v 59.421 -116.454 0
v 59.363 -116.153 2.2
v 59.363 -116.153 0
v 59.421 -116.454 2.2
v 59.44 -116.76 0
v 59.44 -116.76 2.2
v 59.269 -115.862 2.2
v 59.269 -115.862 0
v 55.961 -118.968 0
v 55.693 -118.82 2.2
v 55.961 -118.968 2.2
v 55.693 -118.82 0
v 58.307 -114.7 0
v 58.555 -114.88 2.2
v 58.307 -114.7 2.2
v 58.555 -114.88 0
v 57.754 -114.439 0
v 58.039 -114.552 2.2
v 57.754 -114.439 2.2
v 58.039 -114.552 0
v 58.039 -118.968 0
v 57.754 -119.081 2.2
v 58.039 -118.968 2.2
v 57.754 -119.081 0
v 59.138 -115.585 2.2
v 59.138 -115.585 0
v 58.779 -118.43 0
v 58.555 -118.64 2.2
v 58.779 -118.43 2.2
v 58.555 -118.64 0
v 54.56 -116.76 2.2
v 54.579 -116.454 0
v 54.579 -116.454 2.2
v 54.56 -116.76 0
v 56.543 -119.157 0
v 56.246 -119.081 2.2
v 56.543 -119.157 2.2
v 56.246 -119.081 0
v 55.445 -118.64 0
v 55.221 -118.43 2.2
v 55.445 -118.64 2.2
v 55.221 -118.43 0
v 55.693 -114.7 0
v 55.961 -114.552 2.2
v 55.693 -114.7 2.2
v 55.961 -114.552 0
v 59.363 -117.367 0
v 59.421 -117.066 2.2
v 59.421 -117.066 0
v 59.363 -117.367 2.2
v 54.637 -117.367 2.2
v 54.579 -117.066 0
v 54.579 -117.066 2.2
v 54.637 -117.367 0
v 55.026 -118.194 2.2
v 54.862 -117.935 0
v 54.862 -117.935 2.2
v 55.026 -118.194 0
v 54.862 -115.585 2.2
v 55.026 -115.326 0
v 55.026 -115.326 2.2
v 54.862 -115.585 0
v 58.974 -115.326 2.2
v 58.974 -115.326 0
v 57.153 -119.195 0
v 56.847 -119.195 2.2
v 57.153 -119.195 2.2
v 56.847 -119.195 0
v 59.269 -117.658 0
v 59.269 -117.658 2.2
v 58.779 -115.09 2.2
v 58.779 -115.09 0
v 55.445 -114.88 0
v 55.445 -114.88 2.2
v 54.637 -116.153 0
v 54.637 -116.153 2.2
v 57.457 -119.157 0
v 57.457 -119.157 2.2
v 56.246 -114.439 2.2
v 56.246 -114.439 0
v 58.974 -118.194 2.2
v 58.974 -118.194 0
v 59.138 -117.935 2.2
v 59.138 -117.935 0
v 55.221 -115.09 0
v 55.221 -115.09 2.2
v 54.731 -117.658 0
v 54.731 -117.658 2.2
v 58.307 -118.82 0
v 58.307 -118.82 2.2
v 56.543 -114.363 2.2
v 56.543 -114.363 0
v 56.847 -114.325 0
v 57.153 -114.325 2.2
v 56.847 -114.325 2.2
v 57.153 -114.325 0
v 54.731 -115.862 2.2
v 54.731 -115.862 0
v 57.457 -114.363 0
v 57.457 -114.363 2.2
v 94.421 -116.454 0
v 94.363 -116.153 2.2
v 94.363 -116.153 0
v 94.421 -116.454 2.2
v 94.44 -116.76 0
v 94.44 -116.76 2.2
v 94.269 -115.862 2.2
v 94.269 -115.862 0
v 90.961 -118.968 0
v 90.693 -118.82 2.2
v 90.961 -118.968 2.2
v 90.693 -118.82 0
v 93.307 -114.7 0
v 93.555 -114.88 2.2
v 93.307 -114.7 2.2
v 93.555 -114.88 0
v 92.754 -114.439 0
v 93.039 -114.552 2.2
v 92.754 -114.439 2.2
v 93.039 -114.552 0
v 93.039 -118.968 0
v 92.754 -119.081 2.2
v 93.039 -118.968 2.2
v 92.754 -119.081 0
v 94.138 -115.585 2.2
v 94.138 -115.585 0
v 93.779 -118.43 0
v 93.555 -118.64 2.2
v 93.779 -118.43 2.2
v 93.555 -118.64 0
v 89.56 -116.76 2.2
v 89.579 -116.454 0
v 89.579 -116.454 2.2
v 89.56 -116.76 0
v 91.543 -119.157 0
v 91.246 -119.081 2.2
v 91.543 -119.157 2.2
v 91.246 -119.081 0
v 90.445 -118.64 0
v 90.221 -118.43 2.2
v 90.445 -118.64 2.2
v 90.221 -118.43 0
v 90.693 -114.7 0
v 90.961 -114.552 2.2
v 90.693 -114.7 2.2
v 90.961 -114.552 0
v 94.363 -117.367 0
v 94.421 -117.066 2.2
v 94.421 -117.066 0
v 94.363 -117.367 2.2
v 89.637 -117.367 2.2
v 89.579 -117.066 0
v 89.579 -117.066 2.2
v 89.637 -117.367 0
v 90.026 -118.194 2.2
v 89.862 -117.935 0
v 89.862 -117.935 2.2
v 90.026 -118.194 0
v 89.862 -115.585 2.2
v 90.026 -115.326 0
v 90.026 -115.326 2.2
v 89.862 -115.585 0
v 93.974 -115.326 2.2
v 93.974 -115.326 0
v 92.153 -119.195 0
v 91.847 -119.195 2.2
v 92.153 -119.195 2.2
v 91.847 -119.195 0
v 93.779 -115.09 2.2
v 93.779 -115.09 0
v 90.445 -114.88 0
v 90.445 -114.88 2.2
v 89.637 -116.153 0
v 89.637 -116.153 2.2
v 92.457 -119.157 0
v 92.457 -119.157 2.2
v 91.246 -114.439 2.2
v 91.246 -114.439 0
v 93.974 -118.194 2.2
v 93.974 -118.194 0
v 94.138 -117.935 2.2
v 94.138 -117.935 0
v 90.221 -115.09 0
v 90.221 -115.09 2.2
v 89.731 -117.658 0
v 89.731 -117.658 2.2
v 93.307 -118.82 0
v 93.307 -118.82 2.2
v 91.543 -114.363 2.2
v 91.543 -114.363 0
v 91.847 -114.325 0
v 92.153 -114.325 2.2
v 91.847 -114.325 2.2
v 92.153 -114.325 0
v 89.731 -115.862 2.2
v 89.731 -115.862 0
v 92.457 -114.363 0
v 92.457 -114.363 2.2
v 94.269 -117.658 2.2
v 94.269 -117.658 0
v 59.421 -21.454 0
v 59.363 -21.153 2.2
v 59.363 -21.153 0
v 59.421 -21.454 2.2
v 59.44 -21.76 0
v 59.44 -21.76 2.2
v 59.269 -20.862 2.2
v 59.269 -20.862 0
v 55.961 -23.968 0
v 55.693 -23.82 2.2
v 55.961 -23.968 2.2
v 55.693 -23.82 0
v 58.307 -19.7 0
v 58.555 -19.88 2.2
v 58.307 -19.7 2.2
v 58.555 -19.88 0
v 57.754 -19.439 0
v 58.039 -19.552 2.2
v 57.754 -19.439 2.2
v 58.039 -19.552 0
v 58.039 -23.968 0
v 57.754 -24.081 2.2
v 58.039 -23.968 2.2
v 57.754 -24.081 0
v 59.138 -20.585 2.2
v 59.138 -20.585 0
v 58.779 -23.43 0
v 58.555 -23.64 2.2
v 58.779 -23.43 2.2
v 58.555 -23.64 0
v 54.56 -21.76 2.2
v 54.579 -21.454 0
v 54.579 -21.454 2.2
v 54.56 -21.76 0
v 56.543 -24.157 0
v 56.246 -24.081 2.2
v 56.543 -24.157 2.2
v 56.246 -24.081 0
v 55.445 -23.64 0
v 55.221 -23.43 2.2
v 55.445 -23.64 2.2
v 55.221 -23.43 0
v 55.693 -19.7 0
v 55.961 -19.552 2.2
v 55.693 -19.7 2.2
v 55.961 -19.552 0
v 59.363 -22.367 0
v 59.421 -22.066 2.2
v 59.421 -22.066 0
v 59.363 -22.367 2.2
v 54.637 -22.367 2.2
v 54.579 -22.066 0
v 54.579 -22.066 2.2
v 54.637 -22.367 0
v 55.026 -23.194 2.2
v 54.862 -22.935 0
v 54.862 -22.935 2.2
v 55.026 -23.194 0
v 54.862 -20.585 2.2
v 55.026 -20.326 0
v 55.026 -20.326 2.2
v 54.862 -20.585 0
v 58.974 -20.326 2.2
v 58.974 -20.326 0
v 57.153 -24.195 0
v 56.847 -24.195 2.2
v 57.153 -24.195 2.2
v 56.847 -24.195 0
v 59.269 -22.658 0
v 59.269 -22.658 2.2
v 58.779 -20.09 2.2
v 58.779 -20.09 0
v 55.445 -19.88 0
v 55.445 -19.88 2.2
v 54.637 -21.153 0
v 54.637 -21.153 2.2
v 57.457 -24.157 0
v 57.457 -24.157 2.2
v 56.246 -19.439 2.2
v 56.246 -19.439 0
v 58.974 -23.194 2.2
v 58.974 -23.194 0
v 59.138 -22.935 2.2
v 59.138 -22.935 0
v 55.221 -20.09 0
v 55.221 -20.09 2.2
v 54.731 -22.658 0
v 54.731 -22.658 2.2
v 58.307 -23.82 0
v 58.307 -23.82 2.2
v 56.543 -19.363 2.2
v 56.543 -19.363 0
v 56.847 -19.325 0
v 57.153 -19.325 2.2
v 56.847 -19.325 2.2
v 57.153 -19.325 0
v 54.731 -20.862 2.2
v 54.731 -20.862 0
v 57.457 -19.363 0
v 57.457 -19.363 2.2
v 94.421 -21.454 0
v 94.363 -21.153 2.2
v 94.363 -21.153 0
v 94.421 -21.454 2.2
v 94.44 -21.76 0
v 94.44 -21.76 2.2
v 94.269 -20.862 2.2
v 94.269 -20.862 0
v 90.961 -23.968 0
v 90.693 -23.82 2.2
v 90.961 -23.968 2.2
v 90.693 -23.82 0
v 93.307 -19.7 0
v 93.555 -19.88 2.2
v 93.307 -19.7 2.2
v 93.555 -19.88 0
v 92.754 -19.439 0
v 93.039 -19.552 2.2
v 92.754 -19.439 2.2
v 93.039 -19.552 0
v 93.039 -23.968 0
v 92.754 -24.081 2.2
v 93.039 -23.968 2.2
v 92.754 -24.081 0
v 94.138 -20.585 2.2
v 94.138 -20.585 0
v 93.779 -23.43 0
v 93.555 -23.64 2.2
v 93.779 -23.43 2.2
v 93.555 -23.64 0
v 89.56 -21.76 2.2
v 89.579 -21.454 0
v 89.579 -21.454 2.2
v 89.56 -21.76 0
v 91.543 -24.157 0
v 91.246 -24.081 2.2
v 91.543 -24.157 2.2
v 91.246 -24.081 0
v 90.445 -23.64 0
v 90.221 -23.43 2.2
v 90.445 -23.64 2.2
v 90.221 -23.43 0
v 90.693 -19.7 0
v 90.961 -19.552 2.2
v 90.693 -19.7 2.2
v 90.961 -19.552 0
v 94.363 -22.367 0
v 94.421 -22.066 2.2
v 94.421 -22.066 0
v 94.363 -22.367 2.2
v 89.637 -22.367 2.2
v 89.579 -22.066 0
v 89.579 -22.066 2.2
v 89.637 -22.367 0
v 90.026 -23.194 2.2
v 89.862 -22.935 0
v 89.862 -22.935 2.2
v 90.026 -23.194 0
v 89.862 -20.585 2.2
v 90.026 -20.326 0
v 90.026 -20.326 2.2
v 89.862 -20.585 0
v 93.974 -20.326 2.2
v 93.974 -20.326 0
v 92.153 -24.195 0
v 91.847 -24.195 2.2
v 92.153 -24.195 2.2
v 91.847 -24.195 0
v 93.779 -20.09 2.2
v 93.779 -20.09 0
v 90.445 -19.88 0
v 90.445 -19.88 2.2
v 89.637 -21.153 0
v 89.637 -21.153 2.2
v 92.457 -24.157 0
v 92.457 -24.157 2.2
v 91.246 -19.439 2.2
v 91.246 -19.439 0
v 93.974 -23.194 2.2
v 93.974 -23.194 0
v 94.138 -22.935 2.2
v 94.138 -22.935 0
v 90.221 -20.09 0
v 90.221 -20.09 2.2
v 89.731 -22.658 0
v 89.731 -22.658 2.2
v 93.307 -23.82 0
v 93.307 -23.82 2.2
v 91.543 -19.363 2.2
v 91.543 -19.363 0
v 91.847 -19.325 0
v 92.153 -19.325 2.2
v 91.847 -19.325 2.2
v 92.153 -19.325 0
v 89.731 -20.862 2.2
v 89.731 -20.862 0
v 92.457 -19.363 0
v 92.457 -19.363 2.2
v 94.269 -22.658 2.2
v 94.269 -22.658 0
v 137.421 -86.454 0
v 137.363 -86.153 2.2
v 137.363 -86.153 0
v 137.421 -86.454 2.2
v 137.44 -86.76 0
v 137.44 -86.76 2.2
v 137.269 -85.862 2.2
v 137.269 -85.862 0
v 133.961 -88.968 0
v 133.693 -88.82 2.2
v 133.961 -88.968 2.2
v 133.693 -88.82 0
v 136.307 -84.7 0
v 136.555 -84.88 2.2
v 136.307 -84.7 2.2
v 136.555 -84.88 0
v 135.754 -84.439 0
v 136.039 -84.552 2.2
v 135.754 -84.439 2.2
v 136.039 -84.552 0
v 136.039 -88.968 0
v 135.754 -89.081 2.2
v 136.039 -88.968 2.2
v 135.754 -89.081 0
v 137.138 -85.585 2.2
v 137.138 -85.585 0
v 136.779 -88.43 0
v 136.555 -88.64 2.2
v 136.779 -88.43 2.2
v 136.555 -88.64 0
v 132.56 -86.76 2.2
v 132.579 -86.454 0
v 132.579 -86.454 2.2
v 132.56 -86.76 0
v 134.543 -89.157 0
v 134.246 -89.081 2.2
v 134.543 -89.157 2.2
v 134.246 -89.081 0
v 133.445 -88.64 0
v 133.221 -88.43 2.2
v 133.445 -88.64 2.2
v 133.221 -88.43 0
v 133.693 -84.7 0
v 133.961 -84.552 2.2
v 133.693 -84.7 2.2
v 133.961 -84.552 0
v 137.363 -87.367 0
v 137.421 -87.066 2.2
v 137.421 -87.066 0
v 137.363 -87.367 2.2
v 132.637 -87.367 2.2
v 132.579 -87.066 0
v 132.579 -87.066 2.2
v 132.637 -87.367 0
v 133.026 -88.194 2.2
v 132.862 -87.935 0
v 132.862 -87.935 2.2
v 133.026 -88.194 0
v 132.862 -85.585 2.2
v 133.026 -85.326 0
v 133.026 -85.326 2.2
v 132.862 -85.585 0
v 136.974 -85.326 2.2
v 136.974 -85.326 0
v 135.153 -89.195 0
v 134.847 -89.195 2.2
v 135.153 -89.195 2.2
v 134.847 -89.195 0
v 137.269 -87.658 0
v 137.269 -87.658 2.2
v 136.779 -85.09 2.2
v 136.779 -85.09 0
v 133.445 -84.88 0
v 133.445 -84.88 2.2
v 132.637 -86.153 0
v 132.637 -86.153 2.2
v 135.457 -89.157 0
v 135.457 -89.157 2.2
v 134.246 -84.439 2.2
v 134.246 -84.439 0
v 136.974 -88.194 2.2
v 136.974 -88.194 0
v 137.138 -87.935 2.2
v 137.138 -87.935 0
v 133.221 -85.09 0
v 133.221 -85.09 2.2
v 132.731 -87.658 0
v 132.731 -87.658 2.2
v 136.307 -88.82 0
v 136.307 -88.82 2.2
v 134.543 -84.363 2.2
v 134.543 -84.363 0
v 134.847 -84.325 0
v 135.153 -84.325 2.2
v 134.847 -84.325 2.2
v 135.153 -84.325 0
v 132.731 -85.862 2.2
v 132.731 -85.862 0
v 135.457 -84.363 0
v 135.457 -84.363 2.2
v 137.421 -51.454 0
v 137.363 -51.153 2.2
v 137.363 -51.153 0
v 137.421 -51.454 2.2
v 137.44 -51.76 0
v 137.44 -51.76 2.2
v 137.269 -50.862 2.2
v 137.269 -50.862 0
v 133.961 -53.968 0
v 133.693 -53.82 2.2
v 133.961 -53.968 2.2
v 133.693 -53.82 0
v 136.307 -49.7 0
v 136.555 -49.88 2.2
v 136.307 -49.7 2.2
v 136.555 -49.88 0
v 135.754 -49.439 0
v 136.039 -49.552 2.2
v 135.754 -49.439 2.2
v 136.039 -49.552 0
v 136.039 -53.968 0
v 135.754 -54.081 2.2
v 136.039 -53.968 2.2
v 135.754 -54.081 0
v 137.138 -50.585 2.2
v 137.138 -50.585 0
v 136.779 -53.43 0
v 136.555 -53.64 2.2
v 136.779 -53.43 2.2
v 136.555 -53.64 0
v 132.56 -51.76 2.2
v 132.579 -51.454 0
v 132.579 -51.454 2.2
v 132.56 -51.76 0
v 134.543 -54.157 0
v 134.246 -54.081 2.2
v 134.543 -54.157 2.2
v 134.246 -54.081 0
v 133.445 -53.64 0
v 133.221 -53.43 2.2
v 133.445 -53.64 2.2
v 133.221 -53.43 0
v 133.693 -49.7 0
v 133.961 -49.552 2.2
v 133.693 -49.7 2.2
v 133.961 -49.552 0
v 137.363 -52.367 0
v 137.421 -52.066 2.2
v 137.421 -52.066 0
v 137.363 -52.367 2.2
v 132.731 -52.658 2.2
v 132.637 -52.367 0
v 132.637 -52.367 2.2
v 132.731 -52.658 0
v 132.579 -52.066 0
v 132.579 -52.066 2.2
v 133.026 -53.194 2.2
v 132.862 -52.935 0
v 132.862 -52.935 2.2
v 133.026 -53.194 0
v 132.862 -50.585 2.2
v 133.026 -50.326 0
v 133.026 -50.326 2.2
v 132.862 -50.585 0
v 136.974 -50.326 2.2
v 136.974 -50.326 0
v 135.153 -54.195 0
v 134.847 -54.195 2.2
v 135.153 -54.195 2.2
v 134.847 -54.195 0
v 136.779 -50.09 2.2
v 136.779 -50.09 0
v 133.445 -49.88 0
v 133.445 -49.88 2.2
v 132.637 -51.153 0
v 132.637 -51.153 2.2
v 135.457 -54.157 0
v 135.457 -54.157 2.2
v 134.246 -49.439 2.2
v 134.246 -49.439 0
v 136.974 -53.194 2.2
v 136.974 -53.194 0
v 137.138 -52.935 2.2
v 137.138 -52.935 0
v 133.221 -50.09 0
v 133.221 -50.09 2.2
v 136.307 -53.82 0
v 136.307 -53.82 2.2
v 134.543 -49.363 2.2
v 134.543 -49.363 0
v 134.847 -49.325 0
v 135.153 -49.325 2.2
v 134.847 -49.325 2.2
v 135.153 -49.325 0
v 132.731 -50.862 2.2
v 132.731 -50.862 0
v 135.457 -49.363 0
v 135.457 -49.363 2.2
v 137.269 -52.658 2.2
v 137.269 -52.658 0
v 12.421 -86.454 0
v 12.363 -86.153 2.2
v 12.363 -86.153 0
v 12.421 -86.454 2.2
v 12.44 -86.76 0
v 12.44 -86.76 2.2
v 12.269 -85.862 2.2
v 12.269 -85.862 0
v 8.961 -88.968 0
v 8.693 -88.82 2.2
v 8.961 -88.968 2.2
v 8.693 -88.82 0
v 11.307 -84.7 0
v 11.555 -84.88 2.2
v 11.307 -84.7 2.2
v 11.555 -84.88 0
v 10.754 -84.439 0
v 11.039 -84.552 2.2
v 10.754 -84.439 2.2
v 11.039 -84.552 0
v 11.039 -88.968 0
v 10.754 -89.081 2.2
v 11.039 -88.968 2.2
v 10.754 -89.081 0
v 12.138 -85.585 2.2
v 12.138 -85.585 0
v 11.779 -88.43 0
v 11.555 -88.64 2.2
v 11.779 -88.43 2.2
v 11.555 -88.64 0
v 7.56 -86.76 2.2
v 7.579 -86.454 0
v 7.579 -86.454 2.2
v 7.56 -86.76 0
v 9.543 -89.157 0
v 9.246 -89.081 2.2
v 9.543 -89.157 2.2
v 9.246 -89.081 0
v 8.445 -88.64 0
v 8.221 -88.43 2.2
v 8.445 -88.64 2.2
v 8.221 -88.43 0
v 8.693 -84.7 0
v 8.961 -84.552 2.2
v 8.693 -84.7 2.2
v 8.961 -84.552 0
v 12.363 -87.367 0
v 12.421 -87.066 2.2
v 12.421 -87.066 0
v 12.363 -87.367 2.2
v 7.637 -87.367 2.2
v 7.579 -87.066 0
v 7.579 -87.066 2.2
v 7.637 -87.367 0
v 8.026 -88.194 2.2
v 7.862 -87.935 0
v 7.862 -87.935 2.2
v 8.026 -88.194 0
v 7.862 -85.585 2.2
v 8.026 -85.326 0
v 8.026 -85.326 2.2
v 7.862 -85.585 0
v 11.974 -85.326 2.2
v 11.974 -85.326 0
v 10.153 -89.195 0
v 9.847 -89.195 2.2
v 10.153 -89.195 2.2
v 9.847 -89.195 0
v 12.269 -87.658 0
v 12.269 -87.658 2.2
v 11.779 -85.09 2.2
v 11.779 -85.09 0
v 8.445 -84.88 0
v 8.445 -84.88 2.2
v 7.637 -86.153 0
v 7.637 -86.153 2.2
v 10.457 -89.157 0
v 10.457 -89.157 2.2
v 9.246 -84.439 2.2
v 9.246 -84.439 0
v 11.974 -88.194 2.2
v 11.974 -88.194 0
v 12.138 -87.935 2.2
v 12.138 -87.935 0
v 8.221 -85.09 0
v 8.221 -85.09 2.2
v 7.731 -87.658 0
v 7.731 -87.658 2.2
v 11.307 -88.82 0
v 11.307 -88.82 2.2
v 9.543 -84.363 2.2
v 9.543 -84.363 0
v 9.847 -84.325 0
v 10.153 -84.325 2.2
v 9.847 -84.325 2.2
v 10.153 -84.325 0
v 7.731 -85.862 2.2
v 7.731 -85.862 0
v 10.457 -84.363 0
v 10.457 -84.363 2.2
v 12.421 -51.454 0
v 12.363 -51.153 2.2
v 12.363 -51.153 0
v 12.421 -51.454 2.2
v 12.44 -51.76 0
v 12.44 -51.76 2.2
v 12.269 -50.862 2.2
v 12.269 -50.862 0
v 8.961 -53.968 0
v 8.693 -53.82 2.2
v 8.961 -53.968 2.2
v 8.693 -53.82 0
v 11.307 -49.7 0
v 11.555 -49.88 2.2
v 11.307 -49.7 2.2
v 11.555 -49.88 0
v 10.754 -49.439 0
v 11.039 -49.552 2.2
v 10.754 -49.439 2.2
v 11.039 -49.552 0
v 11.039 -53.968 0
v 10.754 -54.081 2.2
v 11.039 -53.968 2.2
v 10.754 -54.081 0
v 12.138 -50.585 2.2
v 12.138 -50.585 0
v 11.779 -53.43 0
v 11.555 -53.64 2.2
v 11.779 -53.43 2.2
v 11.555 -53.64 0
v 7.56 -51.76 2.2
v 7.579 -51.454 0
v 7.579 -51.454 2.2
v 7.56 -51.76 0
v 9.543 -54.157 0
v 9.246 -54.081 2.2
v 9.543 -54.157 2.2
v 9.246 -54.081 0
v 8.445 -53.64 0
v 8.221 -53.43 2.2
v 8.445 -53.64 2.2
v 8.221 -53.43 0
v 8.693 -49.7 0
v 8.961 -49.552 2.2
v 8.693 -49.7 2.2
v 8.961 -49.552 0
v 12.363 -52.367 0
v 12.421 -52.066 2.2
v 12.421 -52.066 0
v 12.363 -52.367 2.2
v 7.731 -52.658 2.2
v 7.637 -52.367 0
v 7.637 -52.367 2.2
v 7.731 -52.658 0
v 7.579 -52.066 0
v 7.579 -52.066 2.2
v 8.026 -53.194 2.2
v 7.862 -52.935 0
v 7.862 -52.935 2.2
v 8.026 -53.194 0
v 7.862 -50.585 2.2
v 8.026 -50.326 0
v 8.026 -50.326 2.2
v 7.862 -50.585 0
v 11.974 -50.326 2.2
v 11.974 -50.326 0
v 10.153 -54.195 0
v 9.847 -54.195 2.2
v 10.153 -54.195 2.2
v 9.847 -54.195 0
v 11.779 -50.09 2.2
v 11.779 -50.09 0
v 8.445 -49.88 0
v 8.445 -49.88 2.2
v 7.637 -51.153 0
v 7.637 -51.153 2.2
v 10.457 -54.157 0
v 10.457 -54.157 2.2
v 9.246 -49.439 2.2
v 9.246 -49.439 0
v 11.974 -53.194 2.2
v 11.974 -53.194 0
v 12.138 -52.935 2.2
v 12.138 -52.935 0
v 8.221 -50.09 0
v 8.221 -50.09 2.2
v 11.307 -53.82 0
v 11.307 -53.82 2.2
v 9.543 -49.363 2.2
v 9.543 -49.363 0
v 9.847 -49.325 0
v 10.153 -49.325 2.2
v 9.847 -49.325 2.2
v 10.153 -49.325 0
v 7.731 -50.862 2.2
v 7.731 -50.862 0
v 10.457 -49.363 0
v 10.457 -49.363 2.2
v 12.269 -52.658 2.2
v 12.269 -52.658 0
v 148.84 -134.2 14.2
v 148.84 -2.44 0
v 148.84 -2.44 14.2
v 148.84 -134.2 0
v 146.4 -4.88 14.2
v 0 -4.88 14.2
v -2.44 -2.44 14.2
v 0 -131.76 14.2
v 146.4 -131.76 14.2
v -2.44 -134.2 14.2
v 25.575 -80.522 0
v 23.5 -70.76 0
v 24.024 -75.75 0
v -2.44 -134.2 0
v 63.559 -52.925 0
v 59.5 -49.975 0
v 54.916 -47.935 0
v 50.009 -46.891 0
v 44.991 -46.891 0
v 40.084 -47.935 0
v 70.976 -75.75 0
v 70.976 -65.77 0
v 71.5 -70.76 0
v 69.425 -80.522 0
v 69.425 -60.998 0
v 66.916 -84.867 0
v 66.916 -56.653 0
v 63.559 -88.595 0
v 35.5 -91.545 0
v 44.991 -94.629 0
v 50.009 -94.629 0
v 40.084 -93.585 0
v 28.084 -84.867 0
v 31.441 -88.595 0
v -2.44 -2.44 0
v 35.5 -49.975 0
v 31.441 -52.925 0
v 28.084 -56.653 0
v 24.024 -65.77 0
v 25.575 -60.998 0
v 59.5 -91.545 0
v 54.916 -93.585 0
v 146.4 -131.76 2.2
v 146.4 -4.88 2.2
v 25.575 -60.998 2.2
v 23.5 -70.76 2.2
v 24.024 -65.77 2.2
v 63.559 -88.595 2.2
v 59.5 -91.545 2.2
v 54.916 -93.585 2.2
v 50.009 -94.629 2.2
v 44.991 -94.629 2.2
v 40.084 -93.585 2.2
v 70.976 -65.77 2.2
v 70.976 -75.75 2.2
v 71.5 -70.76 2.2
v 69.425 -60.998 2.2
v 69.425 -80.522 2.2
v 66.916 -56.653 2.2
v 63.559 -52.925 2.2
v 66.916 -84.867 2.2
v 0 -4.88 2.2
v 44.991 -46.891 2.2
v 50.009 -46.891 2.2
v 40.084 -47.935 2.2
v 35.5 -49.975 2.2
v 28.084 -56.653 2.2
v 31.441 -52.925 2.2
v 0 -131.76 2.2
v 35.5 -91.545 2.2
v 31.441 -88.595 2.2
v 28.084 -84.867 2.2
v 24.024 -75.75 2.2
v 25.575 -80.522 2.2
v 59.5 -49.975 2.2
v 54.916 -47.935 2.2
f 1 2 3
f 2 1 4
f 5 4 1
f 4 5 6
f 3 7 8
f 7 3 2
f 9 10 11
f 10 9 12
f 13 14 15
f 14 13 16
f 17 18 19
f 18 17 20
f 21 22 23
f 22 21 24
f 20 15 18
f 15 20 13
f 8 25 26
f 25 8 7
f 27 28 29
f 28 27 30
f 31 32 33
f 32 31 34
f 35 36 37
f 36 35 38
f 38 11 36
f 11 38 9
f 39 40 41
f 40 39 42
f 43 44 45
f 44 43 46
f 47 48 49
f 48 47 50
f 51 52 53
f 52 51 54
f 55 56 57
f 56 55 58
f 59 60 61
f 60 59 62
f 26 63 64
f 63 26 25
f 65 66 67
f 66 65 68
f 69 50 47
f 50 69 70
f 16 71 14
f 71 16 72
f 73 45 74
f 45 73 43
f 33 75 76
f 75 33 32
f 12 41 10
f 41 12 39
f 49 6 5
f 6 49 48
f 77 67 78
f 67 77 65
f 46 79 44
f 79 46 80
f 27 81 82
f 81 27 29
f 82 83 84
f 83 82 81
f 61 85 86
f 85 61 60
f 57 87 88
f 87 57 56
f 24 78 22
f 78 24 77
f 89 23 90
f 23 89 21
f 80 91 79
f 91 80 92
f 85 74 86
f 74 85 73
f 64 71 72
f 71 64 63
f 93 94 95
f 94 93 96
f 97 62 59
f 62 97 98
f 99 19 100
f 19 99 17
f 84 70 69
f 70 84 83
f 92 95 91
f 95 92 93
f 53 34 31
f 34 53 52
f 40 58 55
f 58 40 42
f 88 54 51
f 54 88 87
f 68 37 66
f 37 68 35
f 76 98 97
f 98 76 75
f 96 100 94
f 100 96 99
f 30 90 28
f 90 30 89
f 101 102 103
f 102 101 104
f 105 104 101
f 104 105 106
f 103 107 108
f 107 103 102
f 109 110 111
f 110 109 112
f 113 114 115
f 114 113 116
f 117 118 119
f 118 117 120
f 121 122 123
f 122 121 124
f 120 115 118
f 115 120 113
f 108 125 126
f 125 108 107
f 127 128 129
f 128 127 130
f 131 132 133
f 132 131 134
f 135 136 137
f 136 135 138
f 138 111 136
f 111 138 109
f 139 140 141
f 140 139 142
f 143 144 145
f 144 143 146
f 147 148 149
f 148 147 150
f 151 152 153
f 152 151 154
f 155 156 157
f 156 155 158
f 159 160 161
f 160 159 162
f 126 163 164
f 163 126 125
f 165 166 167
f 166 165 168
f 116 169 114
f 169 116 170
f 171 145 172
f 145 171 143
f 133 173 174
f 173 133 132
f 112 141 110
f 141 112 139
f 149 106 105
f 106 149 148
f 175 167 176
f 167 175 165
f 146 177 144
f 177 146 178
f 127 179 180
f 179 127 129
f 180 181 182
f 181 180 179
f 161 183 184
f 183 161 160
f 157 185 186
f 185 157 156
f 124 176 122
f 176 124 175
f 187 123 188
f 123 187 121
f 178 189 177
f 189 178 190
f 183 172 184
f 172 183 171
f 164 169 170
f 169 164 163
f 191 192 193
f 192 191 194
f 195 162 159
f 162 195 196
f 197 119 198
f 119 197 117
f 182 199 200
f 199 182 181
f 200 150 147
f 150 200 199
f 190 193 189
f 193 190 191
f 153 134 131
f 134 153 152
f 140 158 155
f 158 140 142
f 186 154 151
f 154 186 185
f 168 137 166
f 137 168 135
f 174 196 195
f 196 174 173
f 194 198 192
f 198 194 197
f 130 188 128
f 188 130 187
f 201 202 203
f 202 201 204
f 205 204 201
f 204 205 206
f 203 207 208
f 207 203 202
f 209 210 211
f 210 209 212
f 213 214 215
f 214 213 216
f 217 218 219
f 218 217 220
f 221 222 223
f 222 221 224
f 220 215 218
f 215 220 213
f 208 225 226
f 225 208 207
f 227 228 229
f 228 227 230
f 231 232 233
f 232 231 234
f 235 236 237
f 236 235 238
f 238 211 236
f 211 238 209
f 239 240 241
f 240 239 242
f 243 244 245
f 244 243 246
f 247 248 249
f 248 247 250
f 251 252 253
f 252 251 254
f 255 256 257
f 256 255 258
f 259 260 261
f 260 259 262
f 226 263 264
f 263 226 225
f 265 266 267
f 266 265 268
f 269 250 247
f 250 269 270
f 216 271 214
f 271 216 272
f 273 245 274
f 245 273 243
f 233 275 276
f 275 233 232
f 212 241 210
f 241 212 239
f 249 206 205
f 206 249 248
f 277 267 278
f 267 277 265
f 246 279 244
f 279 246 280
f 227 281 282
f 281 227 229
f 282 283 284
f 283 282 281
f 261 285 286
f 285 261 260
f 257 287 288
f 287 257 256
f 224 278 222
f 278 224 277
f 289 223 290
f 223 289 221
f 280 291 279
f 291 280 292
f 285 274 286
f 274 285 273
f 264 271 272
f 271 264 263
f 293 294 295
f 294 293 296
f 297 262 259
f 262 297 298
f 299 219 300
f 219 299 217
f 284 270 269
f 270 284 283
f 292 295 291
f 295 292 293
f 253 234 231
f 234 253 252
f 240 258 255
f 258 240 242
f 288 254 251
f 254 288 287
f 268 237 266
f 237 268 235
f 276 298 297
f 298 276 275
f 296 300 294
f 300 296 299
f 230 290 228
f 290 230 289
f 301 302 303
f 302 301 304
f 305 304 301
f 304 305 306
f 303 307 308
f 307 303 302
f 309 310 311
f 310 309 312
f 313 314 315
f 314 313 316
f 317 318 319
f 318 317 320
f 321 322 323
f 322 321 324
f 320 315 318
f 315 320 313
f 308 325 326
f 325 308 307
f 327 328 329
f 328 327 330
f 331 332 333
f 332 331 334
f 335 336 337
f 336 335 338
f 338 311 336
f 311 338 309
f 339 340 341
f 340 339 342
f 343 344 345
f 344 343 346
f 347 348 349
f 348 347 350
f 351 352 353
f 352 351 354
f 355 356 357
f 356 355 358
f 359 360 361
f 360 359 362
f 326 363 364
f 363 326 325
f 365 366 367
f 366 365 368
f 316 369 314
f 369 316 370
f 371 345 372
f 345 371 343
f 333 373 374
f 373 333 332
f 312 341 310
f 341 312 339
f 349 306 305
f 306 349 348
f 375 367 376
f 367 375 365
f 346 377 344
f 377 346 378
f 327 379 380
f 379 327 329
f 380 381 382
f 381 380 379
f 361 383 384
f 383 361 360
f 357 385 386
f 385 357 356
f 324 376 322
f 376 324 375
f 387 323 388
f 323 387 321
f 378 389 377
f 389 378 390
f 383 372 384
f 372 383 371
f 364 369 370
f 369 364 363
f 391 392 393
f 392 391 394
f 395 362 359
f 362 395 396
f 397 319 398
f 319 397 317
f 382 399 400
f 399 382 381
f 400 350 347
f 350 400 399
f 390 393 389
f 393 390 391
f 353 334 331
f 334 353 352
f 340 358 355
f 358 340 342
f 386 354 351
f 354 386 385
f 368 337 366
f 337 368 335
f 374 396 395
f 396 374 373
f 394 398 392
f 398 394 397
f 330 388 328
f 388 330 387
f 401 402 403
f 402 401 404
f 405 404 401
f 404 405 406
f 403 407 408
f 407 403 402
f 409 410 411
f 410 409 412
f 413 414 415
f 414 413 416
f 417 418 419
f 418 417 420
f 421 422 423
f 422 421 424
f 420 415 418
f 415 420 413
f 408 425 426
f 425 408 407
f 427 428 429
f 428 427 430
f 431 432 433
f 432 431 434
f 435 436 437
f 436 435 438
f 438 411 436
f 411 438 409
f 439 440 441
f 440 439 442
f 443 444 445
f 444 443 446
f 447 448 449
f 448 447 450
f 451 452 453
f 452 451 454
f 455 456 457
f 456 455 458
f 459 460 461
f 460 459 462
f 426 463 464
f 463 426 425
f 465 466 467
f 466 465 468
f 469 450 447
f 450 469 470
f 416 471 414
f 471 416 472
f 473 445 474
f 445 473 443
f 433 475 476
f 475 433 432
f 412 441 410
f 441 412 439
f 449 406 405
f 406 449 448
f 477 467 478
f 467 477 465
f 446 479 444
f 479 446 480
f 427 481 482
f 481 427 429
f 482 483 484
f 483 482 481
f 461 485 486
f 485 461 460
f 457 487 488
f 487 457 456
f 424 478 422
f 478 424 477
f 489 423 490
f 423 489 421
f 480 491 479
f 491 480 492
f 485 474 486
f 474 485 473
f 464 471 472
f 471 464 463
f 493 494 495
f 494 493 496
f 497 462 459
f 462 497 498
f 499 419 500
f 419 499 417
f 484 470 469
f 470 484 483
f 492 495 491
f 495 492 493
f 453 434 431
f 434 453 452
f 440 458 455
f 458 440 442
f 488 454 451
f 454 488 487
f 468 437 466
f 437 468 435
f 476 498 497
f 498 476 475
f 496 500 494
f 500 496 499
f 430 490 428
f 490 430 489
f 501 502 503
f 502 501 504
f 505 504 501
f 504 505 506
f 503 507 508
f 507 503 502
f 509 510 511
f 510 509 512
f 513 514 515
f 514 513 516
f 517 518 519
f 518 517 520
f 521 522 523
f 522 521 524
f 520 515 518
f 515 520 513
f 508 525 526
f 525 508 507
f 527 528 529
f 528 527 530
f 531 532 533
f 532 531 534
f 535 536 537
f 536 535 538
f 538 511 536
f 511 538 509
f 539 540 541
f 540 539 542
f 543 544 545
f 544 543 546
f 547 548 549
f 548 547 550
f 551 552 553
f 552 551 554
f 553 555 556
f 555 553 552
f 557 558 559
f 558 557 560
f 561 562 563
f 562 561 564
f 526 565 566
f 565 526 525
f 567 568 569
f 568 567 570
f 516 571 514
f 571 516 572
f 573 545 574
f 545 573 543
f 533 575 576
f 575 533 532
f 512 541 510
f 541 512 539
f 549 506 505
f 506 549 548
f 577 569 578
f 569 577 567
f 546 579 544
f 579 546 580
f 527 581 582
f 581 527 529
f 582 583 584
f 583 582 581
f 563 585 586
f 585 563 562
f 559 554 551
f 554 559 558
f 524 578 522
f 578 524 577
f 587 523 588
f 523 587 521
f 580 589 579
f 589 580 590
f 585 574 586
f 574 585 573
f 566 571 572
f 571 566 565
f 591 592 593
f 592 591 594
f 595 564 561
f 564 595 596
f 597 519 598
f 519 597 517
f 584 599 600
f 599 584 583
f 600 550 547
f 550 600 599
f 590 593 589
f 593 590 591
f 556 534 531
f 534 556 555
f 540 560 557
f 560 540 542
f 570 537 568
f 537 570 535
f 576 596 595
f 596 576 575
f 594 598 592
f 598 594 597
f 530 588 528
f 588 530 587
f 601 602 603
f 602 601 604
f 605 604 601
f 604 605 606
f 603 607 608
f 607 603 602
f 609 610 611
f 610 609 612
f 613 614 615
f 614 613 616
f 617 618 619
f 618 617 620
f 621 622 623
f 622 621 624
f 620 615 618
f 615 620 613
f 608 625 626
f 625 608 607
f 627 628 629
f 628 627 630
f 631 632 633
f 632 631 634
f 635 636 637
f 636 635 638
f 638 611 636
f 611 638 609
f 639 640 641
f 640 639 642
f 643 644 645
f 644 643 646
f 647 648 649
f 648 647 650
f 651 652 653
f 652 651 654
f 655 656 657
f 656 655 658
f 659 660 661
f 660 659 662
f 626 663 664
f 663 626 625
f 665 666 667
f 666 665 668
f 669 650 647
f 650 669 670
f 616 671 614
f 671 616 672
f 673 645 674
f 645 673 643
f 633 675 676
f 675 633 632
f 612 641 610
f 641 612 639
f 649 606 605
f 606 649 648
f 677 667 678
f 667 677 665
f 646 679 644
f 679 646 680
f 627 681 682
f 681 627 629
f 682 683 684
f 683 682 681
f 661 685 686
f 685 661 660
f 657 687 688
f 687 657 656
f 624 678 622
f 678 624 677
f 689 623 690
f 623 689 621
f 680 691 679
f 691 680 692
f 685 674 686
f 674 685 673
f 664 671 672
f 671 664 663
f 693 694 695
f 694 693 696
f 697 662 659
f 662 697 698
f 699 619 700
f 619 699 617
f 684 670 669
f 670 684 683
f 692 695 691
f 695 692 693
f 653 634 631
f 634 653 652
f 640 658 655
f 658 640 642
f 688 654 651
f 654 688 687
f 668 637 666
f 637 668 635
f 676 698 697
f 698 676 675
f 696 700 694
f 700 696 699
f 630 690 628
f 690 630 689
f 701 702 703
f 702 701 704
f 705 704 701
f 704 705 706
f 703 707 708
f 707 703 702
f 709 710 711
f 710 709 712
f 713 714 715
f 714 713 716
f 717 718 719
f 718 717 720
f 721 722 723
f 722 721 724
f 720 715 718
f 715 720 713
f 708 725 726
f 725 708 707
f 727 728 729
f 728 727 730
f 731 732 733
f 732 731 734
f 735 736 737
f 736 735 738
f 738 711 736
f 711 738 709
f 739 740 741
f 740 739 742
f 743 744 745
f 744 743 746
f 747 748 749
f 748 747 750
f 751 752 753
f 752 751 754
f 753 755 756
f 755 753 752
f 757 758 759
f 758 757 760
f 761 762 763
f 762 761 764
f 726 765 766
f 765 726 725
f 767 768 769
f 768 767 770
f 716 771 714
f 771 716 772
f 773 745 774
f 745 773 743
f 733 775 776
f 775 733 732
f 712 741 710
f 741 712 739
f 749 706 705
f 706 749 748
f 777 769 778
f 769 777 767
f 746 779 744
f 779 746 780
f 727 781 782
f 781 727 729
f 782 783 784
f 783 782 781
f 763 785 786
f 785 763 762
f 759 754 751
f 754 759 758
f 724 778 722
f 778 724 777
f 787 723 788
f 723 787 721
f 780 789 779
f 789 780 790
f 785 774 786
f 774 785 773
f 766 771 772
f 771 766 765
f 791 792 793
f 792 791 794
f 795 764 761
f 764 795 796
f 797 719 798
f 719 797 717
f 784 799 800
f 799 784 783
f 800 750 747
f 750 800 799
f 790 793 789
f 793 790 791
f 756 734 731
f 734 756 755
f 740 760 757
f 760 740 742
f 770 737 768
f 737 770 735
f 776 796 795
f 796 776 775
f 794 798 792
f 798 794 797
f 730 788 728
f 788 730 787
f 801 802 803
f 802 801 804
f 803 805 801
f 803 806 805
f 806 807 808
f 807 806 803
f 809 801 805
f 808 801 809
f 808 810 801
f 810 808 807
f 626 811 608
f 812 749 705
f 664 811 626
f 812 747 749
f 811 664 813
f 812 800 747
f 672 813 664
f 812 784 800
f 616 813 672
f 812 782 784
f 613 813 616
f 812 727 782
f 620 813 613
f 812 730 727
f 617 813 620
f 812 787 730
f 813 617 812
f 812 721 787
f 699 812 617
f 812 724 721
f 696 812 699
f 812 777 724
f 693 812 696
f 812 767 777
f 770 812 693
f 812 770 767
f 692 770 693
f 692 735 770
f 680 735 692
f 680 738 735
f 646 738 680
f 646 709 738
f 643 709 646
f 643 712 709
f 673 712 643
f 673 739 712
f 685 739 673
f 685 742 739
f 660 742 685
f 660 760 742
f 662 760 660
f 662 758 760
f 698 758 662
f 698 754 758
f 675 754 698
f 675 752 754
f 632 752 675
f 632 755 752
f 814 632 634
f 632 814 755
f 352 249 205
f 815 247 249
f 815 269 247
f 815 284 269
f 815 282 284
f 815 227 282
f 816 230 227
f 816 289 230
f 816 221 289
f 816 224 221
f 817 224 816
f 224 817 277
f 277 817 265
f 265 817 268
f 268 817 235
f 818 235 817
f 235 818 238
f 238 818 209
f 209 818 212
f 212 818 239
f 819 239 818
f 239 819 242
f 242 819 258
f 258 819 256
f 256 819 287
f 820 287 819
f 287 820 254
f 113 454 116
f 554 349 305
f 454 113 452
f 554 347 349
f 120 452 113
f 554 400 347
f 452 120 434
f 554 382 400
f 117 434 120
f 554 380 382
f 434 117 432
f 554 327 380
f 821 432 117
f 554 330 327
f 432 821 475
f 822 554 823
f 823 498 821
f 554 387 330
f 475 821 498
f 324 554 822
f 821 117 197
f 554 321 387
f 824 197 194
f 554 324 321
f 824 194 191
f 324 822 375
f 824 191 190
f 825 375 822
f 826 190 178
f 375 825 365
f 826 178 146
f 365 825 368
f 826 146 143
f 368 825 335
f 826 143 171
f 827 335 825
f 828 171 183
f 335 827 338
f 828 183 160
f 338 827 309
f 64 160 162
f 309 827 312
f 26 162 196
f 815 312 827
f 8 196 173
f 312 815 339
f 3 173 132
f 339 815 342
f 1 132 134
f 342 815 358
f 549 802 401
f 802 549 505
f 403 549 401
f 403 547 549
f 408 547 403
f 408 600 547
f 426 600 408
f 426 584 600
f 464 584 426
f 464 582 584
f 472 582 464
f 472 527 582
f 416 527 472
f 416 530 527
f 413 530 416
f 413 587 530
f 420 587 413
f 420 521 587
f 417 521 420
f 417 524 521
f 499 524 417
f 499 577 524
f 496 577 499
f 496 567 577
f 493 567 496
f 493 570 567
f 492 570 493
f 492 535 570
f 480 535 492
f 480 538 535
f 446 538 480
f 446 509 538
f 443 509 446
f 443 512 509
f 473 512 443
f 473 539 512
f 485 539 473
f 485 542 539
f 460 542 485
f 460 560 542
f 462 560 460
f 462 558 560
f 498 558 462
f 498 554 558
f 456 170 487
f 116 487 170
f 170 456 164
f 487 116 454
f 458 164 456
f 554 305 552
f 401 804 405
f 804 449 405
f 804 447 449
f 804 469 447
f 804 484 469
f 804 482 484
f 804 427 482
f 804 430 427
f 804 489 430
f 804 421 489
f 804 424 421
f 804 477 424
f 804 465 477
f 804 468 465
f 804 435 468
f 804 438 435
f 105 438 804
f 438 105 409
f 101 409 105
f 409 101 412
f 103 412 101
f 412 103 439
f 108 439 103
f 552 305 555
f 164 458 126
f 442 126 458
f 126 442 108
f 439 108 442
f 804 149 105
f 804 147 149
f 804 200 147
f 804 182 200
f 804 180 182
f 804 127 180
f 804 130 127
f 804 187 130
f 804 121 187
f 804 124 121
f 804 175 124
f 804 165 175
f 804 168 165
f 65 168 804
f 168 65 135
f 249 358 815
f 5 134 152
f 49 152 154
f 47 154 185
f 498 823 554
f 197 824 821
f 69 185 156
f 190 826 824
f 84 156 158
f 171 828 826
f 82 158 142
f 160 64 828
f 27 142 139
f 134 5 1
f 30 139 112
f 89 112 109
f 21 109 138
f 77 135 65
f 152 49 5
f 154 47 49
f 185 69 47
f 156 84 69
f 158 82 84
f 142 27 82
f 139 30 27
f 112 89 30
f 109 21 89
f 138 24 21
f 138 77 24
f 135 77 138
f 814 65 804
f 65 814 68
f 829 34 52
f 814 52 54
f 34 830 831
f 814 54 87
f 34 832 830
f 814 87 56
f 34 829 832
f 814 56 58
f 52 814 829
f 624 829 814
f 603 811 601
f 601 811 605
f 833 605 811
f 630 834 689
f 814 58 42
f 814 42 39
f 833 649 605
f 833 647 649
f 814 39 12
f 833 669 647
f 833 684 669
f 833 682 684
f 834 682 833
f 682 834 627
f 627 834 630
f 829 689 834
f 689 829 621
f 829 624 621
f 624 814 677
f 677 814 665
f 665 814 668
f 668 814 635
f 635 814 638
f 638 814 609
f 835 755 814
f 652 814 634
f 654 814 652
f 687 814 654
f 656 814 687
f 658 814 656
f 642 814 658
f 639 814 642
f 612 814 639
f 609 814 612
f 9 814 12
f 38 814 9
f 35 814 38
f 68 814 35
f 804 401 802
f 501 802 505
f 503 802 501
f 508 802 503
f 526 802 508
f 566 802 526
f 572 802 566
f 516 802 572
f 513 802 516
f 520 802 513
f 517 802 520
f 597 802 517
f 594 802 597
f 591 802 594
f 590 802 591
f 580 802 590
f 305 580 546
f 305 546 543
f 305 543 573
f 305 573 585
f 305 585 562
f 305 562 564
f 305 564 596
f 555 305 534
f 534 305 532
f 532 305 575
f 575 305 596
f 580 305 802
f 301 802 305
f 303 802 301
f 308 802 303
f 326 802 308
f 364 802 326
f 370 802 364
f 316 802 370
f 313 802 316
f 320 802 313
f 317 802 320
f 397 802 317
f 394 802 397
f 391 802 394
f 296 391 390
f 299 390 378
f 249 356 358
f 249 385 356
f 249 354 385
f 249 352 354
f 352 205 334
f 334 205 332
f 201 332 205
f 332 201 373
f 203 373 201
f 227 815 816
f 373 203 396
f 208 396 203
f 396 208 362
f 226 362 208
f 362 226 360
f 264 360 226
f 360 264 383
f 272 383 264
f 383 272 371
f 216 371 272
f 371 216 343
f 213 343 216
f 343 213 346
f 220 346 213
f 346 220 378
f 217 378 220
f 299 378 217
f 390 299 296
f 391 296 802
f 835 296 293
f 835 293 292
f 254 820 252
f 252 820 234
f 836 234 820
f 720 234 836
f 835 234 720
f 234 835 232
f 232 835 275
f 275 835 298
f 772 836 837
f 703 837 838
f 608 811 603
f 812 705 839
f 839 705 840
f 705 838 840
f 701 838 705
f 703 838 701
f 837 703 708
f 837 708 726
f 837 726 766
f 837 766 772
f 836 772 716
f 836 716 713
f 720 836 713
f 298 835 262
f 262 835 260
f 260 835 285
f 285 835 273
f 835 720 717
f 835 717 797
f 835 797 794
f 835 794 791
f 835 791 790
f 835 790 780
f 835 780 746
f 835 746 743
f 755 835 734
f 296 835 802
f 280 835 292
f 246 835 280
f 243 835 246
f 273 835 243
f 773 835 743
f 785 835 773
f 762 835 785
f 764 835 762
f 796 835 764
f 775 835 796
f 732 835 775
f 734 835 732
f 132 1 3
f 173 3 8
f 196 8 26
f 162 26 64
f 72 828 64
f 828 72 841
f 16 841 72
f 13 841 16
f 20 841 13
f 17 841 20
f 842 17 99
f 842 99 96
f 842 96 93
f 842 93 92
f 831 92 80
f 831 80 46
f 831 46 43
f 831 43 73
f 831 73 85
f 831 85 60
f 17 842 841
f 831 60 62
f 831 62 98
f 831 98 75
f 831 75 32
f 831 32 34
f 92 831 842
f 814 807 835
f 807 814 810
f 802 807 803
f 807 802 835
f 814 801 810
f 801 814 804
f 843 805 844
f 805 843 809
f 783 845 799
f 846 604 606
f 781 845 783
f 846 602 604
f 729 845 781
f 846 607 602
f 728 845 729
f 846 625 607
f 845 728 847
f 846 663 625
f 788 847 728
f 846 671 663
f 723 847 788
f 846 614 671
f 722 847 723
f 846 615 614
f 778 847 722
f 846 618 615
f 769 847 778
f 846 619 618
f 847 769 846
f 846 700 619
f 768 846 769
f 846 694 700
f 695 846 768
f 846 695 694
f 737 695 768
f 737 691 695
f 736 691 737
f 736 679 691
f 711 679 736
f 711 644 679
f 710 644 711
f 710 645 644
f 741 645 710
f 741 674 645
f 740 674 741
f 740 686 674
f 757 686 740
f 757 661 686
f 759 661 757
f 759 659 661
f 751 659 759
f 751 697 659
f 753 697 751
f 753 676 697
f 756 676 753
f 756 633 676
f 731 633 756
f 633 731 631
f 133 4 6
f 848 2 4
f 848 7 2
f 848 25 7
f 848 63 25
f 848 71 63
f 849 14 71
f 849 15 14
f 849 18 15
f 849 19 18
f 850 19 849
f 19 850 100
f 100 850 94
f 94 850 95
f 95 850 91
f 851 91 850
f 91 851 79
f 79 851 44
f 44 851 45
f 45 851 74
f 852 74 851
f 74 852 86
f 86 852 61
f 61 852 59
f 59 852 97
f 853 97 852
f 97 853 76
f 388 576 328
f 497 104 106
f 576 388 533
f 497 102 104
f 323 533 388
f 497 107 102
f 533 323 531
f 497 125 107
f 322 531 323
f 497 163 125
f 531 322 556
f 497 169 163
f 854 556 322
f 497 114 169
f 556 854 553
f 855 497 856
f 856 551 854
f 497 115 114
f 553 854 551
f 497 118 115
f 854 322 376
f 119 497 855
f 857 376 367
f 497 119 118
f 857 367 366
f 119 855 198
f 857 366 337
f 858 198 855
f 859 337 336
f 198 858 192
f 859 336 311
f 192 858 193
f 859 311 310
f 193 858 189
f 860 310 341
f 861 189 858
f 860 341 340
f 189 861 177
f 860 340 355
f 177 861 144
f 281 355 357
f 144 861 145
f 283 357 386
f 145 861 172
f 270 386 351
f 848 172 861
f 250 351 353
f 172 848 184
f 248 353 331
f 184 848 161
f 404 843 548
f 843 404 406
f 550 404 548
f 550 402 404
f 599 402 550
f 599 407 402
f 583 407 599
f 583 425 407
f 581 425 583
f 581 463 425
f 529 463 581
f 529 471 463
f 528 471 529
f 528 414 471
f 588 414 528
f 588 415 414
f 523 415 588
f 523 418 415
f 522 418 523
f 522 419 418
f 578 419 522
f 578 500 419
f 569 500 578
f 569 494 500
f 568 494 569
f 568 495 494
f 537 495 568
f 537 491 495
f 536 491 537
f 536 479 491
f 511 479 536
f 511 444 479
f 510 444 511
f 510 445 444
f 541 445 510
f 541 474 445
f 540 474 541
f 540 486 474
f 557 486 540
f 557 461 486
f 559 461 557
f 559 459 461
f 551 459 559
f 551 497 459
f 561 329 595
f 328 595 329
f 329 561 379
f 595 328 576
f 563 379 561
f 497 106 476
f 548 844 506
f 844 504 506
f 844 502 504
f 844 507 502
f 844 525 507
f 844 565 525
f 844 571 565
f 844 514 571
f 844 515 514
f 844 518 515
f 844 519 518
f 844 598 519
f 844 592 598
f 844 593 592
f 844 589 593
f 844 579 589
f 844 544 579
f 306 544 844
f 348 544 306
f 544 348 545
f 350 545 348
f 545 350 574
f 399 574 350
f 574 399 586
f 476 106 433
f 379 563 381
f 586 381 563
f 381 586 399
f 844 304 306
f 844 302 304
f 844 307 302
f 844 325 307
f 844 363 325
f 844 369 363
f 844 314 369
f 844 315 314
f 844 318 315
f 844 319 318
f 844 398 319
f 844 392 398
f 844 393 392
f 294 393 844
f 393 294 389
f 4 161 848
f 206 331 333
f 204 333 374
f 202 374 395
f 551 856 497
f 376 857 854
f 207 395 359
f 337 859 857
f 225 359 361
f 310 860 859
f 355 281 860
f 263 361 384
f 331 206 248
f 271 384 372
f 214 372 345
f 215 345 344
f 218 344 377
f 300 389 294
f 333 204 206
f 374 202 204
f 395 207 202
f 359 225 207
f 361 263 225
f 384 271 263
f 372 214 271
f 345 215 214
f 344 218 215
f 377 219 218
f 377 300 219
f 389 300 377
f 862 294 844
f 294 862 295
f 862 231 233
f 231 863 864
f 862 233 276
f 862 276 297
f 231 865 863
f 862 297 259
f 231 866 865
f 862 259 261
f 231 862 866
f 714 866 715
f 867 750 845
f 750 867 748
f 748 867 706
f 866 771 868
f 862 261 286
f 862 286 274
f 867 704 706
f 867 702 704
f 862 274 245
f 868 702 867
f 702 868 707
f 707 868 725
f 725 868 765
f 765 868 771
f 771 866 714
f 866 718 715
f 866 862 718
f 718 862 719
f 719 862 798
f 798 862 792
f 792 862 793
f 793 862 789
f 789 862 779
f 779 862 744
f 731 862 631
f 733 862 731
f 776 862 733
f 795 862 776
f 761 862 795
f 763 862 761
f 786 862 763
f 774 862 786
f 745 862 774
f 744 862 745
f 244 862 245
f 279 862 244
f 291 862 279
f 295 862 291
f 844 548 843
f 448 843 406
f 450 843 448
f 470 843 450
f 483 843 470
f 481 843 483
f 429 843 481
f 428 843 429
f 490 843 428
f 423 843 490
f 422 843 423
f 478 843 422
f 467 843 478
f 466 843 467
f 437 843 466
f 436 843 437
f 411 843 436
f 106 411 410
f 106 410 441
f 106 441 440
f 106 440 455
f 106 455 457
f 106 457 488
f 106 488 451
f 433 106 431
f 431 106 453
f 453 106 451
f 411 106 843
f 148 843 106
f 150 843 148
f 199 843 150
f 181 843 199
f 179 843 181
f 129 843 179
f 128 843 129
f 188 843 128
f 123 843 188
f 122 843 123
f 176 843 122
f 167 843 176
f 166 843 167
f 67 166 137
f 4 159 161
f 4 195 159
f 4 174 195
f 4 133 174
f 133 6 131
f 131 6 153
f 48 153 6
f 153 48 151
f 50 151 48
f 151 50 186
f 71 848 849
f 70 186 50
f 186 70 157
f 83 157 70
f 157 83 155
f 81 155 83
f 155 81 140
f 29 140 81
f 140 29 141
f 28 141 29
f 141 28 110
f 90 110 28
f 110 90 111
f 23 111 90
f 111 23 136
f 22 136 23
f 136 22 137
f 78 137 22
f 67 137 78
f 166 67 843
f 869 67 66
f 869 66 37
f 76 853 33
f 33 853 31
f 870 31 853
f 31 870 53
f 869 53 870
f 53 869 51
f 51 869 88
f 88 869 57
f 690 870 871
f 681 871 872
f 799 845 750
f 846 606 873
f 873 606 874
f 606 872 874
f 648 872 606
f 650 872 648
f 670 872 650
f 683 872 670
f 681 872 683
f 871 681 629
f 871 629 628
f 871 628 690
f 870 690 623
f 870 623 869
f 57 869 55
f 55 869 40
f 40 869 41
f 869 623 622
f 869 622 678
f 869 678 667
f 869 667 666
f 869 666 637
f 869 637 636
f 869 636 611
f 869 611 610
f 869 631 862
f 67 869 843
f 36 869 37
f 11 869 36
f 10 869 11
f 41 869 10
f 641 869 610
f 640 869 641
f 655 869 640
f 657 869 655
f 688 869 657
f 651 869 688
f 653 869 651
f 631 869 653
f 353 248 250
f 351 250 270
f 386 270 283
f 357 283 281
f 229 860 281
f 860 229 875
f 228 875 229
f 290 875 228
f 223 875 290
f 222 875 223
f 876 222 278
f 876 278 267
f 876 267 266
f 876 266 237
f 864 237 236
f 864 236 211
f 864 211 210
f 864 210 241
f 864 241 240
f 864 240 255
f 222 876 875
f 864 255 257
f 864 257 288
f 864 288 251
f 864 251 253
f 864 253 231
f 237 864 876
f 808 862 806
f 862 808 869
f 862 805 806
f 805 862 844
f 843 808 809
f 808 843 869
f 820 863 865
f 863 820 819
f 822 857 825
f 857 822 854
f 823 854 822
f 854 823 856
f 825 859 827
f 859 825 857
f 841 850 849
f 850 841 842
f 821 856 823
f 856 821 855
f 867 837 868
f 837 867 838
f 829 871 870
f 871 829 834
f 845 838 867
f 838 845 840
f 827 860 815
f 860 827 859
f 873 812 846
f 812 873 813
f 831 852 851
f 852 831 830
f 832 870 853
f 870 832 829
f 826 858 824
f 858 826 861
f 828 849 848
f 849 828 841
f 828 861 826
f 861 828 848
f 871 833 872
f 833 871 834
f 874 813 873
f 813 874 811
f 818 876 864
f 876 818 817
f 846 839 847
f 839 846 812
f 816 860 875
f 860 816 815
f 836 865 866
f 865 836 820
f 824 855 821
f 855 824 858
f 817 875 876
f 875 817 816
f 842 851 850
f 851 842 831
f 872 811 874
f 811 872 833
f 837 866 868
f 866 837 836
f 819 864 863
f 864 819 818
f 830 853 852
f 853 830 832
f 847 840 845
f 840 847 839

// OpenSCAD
first_layer_height = 0.4;
layer_height = 0.6;

bottom_width = first_layer_height + 3*layer_height;
top_width = 2*layer_height;
// lines: width (mm)
// 2: 1.67
// 3: 2.44
// 4: 3.21
// 5: 3.98
// 6: 4.76
wall_width = 2.44;

function xy_dim_adj(x) = ceil(x/wall_width)*wall_width;
function  z_dim_adj(z) = ceil(z/layer_height)*layer_height;

box_l = 140;
box_w = 120;
box_h = 36;
box_bt_h = 6;
cap_h = 12;

box_l_adj = xy_dim_adj(box_l);
box_w_adj = xy_dim_adj(box_w);
box_h_adj = z_dim_adj(box_h);
box_bt_h_adj = z_dim_adj(box_bt_h);
cap_h_adj = z_dim_adj(cap_h);

screws_hd = 5.55;
screws_hh = 2.38;
screws_hd_offset = first_layer_height+1*layer_height;
screws_d = 3;
screws_wall_offset_cnt = 10;
screws_xy = [
  [                screws_wall_offset_cnt*wall_width,               screws_wall_offset_cnt*wall_width],
  [box_l_adj - (screws_wall_offset_cnt/2)*wall_width,               screws_wall_offset_cnt*wall_width],
  [                screws_wall_offset_cnt*wall_width, box_w_adj-(screws_wall_offset_cnt/2)*wall_width],
  [box_l_adj - (screws_wall_offset_cnt/2)*wall_width, box_w_adj-(screws_wall_offset_cnt/2)*wall_width]
];

screws_hd_adj = xy_dim_adj(screws_hd);
screws_d_adj = xy_dim_adj(screws_d);

*difference() {
  cube([box_l_adj+2*wall_width, box_w_adj+2*wall_width, box_h_adj+bottom_width]);
  union() {
    translate([wall_width, wall_width, bottom_width])
      cube([box_l_adj, box_w_adj, box_h_adj+bottom_width]);
    
    translate([xy_dim_adj(12)+wall_width, -wall_width, bottom_width+box_bt_h_adj])
      cube([xy_dim_adj(118), 3*wall_width, box_h_adj+bottom_width]);
      
    translate([xy_dim_adj(22)+wall_width, box_w_adj, bottom_width+box_bt_h_adj])
      cube([xy_dim_adj(14), 3*wall_width, z_dim_adj(2+2)]);
    translate([xy_dim_adj(80)+wall_width, box_w_adj, bottom_width+box_bt_h_adj])
      cube([xy_dim_adj(10), 3*wall_width, z_dim_adj(3+2)]);
    translate([xy_dim_adj(98)+wall_width, box_w_adj, bottom_width+box_bt_h_adj])
      cube([xy_dim_adj(18), 3*wall_width, z_dim_adj(5+2)]);
    
    for(xy = screws_xy) {
      translate([xy[0], xy[1], screws_hd_offset])
        cylinder(h=bottom_width, d=screws_hd_adj, $fn=50, center=false);
      translate([xy[0], xy[1], 0])
        cylinder(h=3*bottom_width, d=screws_d_adj, $fn=50, center=true);
    }
  }
}

// CAM screws
cam_screws_hh = 2.38;
cam_screws_d = 3;
cam_screws_xy = [
  [ 25, 13],
  [ 60, 13],
];

// cap
cap_fan_d = 48;
cap_fan_x_offset = 47.5;
cap_fan_y_offset = 61;
translate([0, -box_w_adj-4*wall_width, 0])
difference() {
  translate([-wall_width, -wall_width, 0])
    cube([box_l_adj+4*wall_width, box_w_adj+4*wall_width, cap_h_adj+bottom_width]);
  translate([0, 0, bottom_width])
    cube([box_l_adj+2*wall_width, box_w_adj+2*wall_width, cap_h_adj+2*bottom_width]);
  translate([cap_fan_x_offset, cap_fan_y_offset, -bottom_width])
    cylinder(d=cap_fan_d, h=box_h_adj+2*bottom_width);
    
  // CAM screws
  translate([32, 5, 0]) {
    for(xy = cam_screws_xy) {
        translate([xy[0], xy[1]-3, 0])
          cylinder(h=4*bottom_width, d=screws_d_adj, $fn=50, center=true);
    }
  }
  translate([32, 100, 0]) {
    for(xy = cam_screws_xy) {
        translate([xy[0], xy[1]-3, 0])
          cylinder(h=4*bottom_width, d=screws_d_adj, $fn=50, center=true);
    }
  }
  // DOF screws
  translate([125, 20, 0]) {
    for(xy = cam_screws_xy) {
        translate([xy[1]-3, xy[0], 0])
          cylinder(h=4*bottom_width, d=screws_d_adj, $fn=50, center=true);
    }
  }
  translate([0, 20, 0]) {
    for(xy = cam_screws_xy) {
        translate([xy[1]-3, xy[0], 0])
          cylinder(h=4*bottom_width, d=screws_d_adj, $fn=50, center=true);
    }
  }
}
